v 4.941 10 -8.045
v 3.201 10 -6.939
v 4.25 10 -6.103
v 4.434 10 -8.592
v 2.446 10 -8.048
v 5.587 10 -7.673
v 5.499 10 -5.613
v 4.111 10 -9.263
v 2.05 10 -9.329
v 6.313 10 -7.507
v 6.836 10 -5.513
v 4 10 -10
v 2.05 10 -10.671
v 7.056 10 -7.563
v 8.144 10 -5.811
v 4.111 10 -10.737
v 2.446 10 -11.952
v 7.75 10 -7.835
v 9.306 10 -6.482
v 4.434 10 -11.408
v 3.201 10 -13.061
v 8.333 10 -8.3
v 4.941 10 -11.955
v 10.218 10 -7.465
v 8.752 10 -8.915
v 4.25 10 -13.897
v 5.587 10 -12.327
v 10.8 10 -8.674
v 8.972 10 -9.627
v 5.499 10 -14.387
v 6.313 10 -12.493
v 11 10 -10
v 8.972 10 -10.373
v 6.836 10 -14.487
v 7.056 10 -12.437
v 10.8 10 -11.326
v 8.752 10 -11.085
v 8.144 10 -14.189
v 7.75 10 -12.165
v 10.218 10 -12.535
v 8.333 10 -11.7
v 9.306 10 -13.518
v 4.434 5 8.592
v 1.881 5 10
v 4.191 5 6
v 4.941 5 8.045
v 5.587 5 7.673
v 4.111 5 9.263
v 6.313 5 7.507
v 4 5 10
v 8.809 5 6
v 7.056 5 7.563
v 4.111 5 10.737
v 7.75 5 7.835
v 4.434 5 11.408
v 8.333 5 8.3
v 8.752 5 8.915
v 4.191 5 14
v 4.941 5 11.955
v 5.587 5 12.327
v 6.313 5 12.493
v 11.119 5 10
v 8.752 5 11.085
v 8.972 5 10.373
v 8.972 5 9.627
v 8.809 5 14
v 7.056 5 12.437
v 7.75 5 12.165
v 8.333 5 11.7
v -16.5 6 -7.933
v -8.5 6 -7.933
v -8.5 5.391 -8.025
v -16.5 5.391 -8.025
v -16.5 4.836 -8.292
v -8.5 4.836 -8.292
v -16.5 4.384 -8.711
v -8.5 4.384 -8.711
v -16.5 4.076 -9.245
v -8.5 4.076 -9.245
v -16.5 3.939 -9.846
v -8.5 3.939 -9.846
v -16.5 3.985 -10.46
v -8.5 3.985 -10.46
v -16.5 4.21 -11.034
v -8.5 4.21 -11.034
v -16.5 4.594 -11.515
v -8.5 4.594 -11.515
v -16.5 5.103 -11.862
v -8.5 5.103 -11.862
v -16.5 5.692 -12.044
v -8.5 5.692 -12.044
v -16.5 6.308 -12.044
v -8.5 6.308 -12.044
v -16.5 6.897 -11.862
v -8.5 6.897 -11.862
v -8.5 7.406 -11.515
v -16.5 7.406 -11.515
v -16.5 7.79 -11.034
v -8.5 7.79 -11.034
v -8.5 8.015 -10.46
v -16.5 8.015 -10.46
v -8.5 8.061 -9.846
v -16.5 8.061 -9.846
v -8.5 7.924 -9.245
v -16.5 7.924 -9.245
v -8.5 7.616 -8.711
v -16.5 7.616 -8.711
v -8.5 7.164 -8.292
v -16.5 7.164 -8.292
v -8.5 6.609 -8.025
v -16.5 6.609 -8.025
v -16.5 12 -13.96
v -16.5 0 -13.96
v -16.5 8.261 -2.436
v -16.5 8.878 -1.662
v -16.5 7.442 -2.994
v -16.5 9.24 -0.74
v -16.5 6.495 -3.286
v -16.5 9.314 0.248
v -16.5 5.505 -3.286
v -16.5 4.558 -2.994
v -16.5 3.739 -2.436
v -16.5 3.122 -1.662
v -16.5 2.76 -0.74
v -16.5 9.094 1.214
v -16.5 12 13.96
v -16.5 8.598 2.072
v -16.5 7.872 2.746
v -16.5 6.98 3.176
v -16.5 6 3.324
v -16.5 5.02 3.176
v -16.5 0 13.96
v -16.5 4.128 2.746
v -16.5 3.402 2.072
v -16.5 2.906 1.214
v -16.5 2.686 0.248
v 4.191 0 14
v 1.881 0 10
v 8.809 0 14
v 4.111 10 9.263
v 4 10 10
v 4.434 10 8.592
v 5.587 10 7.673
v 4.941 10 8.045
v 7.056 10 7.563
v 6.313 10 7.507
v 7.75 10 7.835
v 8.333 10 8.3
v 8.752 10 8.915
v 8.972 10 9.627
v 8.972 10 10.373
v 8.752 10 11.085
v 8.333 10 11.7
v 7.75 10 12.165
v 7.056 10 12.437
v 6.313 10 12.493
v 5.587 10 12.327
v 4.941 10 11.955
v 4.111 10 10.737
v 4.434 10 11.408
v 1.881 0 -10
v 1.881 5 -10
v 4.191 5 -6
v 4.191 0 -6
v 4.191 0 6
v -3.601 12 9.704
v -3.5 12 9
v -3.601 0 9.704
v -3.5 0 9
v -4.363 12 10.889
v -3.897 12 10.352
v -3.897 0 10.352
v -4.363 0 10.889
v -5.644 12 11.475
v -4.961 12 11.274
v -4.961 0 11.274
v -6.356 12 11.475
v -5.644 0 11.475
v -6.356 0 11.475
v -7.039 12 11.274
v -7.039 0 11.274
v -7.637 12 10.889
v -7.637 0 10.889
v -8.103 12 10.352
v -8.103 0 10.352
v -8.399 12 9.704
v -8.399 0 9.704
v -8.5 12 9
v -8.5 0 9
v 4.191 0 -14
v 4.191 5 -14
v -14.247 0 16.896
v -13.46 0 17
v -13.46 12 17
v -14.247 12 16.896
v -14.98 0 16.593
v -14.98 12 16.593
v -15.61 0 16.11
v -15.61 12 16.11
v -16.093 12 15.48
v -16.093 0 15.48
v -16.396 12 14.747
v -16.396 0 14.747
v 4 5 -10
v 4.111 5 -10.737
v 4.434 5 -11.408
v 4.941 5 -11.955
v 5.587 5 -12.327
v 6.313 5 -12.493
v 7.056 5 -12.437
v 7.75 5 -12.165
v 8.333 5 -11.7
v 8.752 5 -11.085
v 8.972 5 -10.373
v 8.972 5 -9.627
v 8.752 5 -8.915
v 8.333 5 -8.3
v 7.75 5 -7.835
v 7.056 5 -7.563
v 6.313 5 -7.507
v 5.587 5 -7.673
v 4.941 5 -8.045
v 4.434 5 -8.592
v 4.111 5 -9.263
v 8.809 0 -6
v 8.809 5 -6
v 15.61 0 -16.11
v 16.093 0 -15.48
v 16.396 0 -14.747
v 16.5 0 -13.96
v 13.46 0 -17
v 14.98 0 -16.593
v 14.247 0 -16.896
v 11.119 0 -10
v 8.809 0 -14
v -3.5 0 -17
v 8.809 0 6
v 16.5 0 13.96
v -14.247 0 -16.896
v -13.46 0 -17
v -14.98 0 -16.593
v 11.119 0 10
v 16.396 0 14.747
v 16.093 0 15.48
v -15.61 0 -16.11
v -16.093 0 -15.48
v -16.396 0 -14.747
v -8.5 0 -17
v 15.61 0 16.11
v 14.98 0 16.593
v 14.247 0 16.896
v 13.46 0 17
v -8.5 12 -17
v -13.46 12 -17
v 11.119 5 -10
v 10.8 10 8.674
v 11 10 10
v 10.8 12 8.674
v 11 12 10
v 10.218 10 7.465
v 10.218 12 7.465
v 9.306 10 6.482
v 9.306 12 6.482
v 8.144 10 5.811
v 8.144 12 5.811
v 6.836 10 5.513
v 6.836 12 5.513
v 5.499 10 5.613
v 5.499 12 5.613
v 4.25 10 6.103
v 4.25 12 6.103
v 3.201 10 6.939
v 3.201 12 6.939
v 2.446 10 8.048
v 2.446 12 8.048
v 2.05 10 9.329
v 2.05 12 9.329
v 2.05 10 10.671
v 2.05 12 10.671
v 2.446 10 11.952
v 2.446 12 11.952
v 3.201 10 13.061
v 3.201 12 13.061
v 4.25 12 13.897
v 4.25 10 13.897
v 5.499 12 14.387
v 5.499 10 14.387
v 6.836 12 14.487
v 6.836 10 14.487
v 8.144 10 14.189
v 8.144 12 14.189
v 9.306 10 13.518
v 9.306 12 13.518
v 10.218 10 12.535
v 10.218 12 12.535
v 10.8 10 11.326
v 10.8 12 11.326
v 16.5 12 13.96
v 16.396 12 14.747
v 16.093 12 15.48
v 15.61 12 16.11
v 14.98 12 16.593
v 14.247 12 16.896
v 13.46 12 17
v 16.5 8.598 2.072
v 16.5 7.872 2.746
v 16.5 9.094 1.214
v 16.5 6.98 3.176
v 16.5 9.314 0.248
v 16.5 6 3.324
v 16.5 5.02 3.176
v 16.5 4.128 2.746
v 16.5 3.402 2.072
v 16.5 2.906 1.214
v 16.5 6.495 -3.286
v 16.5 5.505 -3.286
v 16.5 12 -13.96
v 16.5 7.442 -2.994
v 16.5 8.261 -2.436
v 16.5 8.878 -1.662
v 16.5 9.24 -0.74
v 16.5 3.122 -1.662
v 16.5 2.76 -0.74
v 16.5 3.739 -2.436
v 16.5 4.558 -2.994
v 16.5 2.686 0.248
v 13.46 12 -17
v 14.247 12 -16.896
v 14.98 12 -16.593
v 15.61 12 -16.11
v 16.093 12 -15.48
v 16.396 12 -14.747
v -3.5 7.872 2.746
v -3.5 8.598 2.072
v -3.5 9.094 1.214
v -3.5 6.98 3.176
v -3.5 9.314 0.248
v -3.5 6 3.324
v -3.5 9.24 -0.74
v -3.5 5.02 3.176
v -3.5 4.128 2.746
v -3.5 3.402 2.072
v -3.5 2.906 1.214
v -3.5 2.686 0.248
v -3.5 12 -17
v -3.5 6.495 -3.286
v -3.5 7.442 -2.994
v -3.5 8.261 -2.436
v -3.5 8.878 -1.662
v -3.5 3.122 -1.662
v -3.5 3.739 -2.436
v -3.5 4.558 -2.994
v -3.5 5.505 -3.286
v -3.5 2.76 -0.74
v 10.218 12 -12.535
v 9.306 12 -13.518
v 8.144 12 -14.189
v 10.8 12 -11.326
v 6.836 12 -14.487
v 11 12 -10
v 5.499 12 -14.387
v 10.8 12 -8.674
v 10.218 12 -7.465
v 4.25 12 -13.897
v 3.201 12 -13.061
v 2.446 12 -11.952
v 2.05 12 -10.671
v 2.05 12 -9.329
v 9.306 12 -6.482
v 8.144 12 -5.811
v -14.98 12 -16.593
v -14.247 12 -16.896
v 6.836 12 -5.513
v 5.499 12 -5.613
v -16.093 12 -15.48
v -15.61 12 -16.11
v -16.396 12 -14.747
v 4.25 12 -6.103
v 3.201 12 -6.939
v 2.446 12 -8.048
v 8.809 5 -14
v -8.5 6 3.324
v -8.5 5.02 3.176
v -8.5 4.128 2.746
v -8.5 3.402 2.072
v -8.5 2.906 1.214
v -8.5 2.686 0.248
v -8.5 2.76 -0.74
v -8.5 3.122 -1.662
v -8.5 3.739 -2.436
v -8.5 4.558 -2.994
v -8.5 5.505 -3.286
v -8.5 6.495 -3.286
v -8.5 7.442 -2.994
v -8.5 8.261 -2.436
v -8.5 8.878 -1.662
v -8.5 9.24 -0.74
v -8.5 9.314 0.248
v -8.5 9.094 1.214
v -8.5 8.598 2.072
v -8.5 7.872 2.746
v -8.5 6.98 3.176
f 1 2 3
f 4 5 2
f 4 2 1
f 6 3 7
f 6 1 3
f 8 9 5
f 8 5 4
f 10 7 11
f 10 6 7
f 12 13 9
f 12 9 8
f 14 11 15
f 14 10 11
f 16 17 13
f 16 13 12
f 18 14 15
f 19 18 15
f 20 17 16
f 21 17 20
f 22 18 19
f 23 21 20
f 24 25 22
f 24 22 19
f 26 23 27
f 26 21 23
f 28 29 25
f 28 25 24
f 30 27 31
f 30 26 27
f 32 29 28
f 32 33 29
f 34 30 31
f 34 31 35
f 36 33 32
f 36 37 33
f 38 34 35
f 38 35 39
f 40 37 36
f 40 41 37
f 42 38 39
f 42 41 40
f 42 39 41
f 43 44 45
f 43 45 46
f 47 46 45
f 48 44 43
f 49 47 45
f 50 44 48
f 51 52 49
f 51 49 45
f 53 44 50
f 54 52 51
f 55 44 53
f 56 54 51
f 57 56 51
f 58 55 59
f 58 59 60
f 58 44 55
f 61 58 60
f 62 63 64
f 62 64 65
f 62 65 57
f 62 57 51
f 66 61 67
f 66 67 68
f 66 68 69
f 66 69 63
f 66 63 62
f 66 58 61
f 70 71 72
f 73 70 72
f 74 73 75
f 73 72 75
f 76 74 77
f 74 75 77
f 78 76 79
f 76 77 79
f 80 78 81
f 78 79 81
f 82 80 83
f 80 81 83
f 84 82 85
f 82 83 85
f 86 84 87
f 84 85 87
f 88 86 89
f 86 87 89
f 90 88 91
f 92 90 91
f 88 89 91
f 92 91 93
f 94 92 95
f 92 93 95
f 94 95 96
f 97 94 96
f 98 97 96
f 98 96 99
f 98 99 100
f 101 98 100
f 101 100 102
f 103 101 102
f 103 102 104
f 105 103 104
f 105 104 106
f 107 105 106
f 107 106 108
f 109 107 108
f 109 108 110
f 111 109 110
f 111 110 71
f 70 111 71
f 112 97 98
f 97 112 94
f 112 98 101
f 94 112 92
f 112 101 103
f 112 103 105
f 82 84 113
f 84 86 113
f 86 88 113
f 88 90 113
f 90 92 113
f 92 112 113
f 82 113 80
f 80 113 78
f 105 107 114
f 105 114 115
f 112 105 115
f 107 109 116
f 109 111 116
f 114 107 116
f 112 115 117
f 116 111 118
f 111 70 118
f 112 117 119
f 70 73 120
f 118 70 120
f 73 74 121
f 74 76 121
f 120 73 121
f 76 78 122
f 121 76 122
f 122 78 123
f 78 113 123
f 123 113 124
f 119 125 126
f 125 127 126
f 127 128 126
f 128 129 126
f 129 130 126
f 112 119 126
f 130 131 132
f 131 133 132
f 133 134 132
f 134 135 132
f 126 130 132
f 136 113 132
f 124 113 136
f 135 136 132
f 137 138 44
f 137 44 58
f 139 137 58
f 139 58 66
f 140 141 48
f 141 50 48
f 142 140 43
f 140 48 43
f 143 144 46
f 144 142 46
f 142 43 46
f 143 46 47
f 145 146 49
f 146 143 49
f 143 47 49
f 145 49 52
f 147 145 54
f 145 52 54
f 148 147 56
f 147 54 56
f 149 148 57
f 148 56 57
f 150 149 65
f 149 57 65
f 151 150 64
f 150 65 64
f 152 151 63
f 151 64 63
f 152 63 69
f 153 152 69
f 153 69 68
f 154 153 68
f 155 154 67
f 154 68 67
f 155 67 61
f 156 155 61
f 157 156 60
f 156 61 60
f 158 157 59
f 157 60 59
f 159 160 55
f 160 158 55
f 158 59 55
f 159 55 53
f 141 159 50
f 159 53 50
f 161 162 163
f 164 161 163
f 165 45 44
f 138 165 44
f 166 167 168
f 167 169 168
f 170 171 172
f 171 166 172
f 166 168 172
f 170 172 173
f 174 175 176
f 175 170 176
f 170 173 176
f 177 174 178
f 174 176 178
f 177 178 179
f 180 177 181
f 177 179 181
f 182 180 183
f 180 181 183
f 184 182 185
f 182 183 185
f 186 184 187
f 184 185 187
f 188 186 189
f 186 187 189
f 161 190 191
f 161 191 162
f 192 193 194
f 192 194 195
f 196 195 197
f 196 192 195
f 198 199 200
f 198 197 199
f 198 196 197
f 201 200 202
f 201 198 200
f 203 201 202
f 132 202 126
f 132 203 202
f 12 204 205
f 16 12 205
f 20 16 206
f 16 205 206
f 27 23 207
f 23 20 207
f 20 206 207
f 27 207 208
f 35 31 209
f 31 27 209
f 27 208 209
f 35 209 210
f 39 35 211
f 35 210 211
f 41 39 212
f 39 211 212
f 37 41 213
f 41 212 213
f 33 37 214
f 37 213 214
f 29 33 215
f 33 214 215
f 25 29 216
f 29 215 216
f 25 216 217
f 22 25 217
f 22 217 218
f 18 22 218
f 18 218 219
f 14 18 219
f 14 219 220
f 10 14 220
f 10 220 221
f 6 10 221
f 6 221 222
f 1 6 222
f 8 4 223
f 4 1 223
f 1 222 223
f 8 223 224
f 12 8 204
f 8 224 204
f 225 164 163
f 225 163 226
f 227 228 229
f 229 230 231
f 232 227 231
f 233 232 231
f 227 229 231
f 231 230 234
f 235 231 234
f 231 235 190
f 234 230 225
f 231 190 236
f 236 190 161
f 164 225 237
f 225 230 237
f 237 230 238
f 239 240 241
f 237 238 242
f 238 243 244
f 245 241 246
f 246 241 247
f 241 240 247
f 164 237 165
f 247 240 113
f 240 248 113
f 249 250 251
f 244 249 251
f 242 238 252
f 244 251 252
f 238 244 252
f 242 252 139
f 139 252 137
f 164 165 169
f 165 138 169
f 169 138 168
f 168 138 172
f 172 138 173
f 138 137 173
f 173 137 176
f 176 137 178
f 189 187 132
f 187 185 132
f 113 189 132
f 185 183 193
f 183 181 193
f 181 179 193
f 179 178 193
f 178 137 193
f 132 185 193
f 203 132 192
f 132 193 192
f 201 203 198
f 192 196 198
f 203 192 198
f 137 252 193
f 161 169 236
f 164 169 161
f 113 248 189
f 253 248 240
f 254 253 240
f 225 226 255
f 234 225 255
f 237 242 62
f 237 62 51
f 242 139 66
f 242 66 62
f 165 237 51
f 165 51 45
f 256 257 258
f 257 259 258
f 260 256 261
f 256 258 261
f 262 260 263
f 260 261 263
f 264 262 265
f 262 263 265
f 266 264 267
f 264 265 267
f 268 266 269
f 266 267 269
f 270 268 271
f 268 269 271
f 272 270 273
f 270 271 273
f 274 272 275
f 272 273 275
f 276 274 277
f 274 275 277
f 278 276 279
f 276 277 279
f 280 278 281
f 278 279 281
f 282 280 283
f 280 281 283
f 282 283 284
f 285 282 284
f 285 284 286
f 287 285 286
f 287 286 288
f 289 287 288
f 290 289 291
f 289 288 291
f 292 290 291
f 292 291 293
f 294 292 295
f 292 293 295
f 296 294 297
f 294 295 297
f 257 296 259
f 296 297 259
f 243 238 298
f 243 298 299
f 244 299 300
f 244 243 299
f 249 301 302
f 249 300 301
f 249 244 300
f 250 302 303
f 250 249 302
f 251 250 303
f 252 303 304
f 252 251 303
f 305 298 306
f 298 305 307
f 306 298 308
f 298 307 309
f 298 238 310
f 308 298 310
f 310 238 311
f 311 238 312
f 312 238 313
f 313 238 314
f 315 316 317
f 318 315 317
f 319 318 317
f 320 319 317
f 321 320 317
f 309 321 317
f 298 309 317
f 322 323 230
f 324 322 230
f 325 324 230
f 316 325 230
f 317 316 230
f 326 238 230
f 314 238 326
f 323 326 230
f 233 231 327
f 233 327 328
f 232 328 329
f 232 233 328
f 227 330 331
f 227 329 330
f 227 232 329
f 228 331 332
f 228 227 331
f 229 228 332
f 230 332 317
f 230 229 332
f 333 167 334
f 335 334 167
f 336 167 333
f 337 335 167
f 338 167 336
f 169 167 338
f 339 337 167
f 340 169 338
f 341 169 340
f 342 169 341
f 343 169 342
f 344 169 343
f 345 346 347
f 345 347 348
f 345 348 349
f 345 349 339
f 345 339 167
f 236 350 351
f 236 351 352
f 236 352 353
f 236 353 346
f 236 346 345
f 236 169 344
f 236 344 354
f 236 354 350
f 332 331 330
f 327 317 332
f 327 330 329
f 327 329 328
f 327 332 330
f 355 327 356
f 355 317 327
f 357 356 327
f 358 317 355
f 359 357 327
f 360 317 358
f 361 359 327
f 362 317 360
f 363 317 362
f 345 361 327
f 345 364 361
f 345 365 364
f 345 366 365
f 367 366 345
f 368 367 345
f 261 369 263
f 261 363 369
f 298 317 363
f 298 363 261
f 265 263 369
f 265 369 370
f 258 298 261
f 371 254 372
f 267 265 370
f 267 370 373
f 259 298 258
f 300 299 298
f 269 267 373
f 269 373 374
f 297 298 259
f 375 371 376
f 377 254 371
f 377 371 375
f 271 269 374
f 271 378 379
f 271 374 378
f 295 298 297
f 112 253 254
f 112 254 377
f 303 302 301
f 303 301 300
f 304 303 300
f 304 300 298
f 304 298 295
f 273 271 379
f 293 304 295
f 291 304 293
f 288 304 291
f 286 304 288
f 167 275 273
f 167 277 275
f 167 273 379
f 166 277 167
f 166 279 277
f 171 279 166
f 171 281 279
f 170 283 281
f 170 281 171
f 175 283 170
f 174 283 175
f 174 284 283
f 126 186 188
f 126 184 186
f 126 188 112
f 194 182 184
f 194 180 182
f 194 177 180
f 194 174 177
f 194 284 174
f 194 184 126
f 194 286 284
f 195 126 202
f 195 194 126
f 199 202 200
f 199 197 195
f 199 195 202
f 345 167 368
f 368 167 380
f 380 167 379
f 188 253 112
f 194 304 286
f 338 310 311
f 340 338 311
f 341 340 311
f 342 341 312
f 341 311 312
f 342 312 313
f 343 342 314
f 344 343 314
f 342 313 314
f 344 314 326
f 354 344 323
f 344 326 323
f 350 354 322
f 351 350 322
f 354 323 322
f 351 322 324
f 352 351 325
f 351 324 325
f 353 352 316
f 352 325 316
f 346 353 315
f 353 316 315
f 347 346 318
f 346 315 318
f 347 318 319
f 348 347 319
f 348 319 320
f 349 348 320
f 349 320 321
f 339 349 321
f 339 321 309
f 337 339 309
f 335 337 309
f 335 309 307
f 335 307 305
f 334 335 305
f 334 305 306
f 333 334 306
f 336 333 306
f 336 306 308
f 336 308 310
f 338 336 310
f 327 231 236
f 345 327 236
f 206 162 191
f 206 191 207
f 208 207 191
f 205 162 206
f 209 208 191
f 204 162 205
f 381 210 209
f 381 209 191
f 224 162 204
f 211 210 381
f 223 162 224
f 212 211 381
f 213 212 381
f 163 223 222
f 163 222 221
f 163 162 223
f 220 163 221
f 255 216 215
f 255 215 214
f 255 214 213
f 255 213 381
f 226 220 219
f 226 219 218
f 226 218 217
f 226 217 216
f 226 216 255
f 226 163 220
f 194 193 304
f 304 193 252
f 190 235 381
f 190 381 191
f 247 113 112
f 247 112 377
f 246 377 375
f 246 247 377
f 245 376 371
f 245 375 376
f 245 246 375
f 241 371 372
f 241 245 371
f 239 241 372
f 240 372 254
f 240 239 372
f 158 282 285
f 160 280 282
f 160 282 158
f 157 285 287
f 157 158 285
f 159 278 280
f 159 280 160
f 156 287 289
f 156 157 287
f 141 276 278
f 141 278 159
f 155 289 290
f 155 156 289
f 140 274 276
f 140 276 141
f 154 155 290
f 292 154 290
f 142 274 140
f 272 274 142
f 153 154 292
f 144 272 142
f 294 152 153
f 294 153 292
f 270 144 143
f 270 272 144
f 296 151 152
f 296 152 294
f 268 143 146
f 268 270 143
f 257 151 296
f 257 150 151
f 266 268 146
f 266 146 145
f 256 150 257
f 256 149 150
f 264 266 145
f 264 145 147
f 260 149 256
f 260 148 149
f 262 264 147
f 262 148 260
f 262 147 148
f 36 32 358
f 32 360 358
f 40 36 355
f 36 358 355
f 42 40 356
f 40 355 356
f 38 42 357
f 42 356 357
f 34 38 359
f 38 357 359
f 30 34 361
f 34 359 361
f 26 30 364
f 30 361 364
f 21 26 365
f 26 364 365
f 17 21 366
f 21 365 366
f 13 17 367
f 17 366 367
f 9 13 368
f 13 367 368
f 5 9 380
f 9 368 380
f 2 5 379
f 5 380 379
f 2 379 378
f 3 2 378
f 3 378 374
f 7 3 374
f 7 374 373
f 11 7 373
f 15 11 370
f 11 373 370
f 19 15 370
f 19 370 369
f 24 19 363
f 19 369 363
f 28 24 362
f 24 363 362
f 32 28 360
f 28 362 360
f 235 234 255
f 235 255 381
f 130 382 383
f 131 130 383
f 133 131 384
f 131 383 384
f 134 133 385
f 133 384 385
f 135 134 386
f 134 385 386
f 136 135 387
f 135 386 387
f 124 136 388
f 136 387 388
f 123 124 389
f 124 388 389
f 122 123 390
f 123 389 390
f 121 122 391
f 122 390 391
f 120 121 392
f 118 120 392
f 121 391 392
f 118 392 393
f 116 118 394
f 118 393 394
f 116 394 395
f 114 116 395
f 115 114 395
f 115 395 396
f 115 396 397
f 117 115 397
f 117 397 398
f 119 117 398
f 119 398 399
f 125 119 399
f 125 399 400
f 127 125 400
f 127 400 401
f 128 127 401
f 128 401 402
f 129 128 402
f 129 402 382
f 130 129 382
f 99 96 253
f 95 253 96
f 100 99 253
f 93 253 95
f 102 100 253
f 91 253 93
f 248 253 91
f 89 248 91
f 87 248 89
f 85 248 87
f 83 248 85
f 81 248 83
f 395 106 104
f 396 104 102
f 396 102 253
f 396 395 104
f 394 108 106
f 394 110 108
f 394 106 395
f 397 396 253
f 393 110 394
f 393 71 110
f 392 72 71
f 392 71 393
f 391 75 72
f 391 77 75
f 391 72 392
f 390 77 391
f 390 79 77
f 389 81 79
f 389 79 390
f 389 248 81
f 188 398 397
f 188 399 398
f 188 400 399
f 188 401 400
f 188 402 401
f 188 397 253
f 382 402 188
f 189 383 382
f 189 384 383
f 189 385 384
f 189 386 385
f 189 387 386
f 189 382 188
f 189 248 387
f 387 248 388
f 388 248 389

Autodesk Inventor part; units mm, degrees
ref_plane "YZ Plane" through (0, 0, 0) normal (1, 0, 0) x (0, 1, 0)
ref_plane "XZ Plane" through (0, 0, 0) normal (0, 1, 0) x (-1, 0, 0)
ref_plane "XY Plane" through (0, 0, 0) normal (0, 0, 1) x (1, 0, 0)
sketch "Sketch1" plane through (0, 0, 0) normal (0, 1, 0) x (-1, 0, 0)
  line L0 (13.46, 17) -> (-13.46, 17)
  line L1 (-16.5, 13.96) -> (-16.5, -13.96)
  line L2 (16.5, -13.96) -> (16.5, 13.96)
  line L3 (6, -19) -> (6, 9) construction
  line L4 (8.5, -17) -> (8.5, 9)
  line L5 (3.5, 9) -> (3.5, -17)
  arc A0 (8.5, 9) -> (3.5, 9) centre (6, 9) ccw
  circle A1 centre (-6.5, 10) radius 2.5
  circle A2 centre (-6.5, -10) radius 2.5
  line L6 (-13.46, -17) -> (3.5, -17)
  line L7 (8.5, -17) -> (13.46, -17)
  arc A3 (13.46, -17) -> (16.5, -13.96) centre (13.46, -13.96) ccw
  arc A4 (16.5, 13.96) -> (13.46, 17) centre (13.46, 13.96) ccw
  arc A5 (-13.46, 17) -> (-16.5, 13.96) centre (-13.46, 13.96) ccw
  arc A6 (-16.5, -13.96) -> (-13.46, -17) centre (-13.46, -13.96) ccw
  point P0 (0, 0)
  point P1 (-16.5, -17)
  point P2 (-16.5, 17)
  point P3 (16.5, -17)
  point P4 (16.5, 0)
  point P5 (0, -17)
  point P6 (6, -5)
  dimension "d0" = 33
  dimension "d1" = 34
  dimension "d2" = 5
  dimension "d4" = 28
  dimension "d5" = 8
  dimension "d6" = 5
  dimension "d7" = 5
  dimension "d8" = 20
  dimension "d9" = 10
  dimension "d10" = 7
  dimension "d11" = 3.04
extrude "Extrusion1" add sketch "Sketch1" along normal blind 12
sketch "Sketch2" plane through (-16.5, 0, -13.96) normal (-1, 0, 0) x (0, 0, 1)
  circle A0 centre (13.96, 6) radius 4
  circle A1 centre (3.96, 6) radius 2.5
  line L0 (0, 0) -> (27.92, 0) projected
  point P0 (13.96, 0)
  point P1 (13.96, 0)
  dimension "d14" = 8
  dimension "d15" = 5
  dimension "d16" = 6
  dimension "d17" = 10
hole "Hole1" at (-16.5, 6, 0) direction (1, 0, 0) diameter 6.647 depth 40 tip angle 118 thread size "M8x1.25" class "6H" standard "ISO Metric profile"
hole "Hole2" at (-16.5, 6, -10) direction (1, 0, 0) diameter 4.134 depth 10 tip angle 118 thread size "M5x0.8" class "6H" standard "ISO Metric profile"
sketch "Sketch3" plane through (0, 12, 0) normal (0, 1, 0) x (1, 0, 0)
  circle A0 centre (6.5, 10) radius 2.5 projected
  circle A1 centre (6.5, -10) radius 2.5 projected
  circle A2 centre (6.5, 10) radius 4.5
  circle A3 centre (6.5, -10) radius 4.5
  point P0 (0, 0)
  dimension "d32" = 9
  dimension "d33" = 9
extrude "Extrusion2" cut sketch "Sketch3" against normal blind 2
sketch "Sketch4" plane through (0, 0, 0) normal (0, -1, 0) x (1, 0, 0)
  circle A0 centre (6.5, 10) radius 2.5 projected
  circle A1 centre (6.5, -10) radius 2.5 projected
  line L0 (4.1906, 6) -> (1.8812, 10)
  line L1 (1.8812, 10) -> (4.1906, 14)
  line L2 (4.1906, 14) -> (8.8094, 14)
  line L3 (8.8094, 14) -> (11.1188, 10)
  line L4 (11.1188, 10) -> (8.8094, 6)
  line L5 (8.8094, 6) -> (4.1906, 6)
  line L6 (8.8094, -6) -> (11.1188, -10)
  line L7 (11.1188, -10) -> (8.8094, -14)
  line L8 (8.8094, -14) -> (4.1906, -14)
  line L9 (4.1906, -14) -> (1.8812, -10)
  line L10 (1.8812, -10) -> (4.1906, -6)
  line L11 (4.1906, -6) -> (8.8094, -6)
  point P0 (0, 0)
  dimension "d36" = 8
  dimension "d37" = 8
extrude "Extrusion3" cut sketch "Sketch4" against normal blind 5
properties part number "Anti-Backlash Nut Block" material "Aluminum 6061"
